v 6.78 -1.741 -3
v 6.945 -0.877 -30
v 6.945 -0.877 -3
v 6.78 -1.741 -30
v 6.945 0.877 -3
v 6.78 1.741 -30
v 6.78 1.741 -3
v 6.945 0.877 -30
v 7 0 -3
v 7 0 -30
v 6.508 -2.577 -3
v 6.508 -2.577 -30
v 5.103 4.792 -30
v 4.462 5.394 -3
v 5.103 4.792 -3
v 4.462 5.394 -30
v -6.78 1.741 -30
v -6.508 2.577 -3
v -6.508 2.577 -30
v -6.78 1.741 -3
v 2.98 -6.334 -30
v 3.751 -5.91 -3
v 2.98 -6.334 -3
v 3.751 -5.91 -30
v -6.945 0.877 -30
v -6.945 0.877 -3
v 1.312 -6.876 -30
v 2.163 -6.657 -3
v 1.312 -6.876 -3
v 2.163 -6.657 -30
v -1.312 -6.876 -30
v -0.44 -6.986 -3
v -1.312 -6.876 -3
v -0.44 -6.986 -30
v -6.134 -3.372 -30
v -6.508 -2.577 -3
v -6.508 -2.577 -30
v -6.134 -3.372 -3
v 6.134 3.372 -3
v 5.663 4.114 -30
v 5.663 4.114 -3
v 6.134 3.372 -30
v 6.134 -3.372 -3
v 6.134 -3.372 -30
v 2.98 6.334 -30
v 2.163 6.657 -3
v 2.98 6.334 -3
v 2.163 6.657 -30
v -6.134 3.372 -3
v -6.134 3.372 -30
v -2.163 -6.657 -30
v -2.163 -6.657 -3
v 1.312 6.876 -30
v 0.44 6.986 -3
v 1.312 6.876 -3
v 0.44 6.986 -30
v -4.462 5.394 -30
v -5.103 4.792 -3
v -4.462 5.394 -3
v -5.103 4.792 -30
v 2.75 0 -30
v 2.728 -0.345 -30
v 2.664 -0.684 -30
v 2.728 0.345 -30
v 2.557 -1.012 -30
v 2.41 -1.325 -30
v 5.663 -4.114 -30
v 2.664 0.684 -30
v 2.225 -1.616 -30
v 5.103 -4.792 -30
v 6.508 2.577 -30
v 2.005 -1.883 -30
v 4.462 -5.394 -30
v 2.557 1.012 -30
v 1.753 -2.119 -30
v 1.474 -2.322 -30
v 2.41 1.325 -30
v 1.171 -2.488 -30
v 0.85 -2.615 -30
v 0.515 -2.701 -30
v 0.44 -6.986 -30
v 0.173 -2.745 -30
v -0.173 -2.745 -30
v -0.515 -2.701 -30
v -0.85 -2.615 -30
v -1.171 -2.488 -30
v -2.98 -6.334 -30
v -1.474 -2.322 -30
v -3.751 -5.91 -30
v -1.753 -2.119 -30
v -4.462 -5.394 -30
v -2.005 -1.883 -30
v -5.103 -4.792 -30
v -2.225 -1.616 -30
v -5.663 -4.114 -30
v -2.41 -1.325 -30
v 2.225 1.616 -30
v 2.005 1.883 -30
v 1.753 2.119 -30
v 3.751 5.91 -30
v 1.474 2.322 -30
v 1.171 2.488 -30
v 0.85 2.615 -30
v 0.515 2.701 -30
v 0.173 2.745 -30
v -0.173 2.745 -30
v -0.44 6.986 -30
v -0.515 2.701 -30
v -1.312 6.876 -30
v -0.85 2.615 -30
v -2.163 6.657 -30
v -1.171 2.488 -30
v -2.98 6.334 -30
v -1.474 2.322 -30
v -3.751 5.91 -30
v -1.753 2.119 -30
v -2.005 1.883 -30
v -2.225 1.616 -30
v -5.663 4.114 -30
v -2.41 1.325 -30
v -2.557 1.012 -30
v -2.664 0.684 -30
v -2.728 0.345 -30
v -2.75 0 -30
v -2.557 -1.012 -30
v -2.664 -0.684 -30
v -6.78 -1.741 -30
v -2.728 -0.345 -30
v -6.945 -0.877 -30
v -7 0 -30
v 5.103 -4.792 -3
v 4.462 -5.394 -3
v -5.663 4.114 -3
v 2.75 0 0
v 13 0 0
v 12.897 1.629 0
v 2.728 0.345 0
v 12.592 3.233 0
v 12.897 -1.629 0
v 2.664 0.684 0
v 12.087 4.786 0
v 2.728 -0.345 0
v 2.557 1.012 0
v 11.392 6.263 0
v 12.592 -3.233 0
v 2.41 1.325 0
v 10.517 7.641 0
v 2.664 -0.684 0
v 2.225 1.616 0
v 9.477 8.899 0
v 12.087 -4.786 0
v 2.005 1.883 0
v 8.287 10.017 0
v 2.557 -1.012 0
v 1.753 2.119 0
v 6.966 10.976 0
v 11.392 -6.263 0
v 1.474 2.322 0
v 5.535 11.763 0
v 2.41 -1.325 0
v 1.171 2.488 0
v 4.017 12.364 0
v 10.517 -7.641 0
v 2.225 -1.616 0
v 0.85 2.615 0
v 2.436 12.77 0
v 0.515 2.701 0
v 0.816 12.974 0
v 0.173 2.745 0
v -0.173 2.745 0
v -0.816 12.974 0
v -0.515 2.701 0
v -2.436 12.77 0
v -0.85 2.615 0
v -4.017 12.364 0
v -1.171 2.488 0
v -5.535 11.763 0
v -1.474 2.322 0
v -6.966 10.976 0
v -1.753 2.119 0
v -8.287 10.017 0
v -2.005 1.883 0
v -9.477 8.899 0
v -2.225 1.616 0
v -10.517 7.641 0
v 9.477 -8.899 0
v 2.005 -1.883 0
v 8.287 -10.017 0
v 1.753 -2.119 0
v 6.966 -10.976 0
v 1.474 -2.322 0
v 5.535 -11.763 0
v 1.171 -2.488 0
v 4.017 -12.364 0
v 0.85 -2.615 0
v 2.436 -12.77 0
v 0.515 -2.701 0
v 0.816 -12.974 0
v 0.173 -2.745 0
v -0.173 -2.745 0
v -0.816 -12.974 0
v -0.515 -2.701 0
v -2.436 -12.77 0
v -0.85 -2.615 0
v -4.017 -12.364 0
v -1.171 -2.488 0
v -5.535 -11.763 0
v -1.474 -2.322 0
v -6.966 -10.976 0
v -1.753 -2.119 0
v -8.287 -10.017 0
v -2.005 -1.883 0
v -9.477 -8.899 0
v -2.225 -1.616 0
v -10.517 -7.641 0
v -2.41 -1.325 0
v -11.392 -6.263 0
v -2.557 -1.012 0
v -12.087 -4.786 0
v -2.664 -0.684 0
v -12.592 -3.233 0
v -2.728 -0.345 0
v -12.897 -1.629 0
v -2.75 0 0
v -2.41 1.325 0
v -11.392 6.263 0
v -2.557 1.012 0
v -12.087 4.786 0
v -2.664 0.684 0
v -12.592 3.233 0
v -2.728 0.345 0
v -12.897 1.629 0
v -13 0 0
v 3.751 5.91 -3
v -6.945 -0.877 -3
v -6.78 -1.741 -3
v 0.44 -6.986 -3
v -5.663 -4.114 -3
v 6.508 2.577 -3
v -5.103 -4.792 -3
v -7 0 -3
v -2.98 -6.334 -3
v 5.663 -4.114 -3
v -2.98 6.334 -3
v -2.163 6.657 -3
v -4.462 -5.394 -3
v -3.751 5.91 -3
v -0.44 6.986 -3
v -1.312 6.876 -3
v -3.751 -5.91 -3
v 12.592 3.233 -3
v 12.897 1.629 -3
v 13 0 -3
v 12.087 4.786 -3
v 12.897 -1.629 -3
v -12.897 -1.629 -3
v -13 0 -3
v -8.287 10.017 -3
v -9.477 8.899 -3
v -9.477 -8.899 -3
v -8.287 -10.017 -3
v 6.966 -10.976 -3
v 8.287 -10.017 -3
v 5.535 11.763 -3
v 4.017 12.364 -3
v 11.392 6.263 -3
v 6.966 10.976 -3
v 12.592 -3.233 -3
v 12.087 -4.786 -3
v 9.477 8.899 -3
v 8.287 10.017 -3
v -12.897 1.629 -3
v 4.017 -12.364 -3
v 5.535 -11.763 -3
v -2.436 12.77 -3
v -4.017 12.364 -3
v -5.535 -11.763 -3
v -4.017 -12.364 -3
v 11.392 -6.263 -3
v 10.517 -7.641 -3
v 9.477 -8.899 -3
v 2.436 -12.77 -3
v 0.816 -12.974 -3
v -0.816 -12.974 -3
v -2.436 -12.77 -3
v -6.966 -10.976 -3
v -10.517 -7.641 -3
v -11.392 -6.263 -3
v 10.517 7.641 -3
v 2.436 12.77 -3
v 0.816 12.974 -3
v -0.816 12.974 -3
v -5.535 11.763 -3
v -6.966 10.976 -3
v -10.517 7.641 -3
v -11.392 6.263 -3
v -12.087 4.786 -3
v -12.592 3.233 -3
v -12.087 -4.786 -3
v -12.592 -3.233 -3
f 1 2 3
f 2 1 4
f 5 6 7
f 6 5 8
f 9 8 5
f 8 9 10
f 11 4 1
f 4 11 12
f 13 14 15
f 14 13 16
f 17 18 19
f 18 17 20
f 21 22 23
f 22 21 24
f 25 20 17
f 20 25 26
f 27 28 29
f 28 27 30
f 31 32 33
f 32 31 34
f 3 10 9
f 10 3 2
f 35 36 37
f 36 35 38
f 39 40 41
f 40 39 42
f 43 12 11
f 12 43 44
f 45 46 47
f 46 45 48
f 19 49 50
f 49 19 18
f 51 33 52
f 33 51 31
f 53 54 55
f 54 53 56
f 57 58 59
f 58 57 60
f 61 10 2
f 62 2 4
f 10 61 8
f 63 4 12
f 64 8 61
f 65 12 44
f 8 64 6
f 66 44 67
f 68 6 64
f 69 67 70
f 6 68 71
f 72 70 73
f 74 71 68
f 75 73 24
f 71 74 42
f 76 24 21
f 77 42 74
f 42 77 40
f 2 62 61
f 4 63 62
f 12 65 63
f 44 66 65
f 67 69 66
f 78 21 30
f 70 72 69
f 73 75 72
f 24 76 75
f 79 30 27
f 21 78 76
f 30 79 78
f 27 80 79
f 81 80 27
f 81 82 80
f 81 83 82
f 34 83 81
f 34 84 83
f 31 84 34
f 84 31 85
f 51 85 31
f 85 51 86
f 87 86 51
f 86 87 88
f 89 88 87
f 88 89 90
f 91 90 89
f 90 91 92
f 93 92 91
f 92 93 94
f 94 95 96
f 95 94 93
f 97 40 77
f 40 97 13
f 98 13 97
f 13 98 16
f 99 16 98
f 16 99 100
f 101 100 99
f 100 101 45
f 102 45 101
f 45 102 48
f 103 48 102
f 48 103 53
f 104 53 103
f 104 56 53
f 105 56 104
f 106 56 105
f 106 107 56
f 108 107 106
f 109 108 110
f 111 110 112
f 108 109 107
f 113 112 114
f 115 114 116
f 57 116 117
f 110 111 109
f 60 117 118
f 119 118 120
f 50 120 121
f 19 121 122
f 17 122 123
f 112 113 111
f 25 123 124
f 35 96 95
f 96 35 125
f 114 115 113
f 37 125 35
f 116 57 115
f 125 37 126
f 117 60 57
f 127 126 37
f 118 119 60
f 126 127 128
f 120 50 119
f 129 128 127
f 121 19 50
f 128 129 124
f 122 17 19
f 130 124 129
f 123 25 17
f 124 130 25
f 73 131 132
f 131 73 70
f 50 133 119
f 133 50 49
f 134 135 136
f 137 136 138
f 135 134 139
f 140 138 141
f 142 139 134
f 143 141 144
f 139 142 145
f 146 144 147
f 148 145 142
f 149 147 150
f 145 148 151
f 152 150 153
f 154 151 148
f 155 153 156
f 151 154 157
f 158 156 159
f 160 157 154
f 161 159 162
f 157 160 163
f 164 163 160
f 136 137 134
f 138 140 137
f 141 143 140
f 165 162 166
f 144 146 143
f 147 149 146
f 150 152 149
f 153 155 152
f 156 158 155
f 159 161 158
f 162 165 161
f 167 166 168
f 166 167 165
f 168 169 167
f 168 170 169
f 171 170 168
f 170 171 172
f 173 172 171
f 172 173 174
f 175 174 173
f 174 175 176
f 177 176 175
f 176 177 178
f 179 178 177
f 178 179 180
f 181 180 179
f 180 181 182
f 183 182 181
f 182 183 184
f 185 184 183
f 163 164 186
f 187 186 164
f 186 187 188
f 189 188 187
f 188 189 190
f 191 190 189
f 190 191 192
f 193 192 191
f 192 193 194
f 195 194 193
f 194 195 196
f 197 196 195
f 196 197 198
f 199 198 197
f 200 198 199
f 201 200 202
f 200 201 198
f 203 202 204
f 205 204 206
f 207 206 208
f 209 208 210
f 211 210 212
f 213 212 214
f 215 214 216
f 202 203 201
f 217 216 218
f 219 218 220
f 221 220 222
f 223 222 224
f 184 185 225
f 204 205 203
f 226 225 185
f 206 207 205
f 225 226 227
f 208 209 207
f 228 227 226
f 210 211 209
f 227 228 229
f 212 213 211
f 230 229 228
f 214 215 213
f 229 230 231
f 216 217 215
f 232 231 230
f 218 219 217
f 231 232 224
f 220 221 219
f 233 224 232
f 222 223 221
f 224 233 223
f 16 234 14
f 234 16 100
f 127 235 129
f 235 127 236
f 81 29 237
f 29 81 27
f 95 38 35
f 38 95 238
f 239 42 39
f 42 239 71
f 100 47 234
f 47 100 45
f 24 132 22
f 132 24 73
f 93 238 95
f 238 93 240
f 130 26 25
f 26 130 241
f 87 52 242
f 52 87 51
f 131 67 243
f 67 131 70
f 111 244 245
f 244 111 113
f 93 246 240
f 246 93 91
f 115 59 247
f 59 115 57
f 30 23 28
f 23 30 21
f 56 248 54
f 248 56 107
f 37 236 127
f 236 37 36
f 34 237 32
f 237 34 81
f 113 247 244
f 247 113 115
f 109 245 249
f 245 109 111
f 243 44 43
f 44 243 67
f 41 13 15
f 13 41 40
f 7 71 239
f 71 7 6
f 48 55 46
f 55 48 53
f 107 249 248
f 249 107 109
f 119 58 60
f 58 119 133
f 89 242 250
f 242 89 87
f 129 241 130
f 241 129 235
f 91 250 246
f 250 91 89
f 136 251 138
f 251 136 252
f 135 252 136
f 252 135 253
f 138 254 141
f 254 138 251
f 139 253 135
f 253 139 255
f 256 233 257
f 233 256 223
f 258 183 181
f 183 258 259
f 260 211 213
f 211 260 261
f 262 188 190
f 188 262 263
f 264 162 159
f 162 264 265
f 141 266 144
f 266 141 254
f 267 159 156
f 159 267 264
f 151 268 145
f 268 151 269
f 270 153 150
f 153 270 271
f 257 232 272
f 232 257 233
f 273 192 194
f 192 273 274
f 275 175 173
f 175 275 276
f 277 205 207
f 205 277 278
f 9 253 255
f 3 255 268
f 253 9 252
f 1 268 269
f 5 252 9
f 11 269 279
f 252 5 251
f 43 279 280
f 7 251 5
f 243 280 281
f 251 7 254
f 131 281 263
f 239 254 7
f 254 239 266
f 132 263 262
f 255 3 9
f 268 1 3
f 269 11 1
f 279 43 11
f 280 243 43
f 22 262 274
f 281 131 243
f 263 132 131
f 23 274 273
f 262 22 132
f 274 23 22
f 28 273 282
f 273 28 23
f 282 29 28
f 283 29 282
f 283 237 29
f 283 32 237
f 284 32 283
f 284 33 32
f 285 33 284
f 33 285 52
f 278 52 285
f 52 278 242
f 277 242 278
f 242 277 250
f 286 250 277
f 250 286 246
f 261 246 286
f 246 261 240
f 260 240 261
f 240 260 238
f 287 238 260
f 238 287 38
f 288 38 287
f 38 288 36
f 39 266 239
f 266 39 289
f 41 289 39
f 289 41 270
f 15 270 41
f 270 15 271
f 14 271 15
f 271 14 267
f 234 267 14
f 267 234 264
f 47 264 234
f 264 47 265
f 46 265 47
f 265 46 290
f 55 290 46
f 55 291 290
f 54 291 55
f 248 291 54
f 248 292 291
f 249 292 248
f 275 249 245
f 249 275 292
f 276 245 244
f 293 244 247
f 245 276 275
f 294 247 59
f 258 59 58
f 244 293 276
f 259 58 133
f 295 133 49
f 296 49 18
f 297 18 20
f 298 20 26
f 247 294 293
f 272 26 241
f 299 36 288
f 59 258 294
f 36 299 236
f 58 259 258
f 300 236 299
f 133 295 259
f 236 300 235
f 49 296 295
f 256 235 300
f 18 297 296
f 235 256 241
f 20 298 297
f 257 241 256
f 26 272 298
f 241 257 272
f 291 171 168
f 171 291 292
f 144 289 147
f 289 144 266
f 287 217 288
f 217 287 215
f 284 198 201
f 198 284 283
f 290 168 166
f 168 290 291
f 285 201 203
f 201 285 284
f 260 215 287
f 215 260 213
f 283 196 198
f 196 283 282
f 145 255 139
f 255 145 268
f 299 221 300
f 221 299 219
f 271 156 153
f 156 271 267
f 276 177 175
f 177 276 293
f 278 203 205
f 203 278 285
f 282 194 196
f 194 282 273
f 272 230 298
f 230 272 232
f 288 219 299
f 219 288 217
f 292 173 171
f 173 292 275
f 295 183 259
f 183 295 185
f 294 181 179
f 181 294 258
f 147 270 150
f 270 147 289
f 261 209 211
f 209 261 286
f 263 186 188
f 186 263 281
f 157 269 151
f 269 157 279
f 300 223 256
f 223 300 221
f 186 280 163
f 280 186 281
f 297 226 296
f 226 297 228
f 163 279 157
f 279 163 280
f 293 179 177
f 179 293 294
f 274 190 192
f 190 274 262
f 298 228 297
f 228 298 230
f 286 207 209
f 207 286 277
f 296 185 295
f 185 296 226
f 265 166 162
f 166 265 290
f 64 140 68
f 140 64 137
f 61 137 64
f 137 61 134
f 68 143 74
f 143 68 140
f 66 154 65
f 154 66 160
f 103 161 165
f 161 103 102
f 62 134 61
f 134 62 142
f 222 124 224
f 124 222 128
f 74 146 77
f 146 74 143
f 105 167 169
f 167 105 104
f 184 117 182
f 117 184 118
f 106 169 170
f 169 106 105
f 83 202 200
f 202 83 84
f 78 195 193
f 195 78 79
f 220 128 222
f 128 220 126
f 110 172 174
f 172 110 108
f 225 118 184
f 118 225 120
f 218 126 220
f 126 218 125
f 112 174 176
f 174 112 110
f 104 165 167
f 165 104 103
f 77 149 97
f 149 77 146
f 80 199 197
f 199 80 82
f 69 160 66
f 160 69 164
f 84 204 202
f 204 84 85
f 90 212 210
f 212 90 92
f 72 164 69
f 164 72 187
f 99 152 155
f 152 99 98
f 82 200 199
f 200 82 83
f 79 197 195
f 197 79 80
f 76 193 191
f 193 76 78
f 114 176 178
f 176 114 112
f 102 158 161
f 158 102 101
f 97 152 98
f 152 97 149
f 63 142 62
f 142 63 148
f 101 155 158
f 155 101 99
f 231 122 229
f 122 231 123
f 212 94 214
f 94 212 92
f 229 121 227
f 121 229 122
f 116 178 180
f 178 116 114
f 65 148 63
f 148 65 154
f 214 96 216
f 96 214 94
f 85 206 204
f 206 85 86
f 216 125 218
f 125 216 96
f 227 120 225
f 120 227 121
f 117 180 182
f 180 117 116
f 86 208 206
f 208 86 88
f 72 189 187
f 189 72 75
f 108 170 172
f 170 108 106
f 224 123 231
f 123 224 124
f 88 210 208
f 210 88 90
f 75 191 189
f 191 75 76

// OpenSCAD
$fn = 50;


difference() {
	union() {
		translate(v = [0, 0, -30.0000000000]) {
			cylinder(h = 30, r = 7.0000000000);
		}
		translate(v = [0, 0, -3.0000000000]) {
			cylinder(h = 3, r = 13.0000000000);
		}
	}
	union() {
		#translate(v = [0, 0, -30]) {
			cylinder(h = 30, r = 2.7500000000);
		}
	}
}
